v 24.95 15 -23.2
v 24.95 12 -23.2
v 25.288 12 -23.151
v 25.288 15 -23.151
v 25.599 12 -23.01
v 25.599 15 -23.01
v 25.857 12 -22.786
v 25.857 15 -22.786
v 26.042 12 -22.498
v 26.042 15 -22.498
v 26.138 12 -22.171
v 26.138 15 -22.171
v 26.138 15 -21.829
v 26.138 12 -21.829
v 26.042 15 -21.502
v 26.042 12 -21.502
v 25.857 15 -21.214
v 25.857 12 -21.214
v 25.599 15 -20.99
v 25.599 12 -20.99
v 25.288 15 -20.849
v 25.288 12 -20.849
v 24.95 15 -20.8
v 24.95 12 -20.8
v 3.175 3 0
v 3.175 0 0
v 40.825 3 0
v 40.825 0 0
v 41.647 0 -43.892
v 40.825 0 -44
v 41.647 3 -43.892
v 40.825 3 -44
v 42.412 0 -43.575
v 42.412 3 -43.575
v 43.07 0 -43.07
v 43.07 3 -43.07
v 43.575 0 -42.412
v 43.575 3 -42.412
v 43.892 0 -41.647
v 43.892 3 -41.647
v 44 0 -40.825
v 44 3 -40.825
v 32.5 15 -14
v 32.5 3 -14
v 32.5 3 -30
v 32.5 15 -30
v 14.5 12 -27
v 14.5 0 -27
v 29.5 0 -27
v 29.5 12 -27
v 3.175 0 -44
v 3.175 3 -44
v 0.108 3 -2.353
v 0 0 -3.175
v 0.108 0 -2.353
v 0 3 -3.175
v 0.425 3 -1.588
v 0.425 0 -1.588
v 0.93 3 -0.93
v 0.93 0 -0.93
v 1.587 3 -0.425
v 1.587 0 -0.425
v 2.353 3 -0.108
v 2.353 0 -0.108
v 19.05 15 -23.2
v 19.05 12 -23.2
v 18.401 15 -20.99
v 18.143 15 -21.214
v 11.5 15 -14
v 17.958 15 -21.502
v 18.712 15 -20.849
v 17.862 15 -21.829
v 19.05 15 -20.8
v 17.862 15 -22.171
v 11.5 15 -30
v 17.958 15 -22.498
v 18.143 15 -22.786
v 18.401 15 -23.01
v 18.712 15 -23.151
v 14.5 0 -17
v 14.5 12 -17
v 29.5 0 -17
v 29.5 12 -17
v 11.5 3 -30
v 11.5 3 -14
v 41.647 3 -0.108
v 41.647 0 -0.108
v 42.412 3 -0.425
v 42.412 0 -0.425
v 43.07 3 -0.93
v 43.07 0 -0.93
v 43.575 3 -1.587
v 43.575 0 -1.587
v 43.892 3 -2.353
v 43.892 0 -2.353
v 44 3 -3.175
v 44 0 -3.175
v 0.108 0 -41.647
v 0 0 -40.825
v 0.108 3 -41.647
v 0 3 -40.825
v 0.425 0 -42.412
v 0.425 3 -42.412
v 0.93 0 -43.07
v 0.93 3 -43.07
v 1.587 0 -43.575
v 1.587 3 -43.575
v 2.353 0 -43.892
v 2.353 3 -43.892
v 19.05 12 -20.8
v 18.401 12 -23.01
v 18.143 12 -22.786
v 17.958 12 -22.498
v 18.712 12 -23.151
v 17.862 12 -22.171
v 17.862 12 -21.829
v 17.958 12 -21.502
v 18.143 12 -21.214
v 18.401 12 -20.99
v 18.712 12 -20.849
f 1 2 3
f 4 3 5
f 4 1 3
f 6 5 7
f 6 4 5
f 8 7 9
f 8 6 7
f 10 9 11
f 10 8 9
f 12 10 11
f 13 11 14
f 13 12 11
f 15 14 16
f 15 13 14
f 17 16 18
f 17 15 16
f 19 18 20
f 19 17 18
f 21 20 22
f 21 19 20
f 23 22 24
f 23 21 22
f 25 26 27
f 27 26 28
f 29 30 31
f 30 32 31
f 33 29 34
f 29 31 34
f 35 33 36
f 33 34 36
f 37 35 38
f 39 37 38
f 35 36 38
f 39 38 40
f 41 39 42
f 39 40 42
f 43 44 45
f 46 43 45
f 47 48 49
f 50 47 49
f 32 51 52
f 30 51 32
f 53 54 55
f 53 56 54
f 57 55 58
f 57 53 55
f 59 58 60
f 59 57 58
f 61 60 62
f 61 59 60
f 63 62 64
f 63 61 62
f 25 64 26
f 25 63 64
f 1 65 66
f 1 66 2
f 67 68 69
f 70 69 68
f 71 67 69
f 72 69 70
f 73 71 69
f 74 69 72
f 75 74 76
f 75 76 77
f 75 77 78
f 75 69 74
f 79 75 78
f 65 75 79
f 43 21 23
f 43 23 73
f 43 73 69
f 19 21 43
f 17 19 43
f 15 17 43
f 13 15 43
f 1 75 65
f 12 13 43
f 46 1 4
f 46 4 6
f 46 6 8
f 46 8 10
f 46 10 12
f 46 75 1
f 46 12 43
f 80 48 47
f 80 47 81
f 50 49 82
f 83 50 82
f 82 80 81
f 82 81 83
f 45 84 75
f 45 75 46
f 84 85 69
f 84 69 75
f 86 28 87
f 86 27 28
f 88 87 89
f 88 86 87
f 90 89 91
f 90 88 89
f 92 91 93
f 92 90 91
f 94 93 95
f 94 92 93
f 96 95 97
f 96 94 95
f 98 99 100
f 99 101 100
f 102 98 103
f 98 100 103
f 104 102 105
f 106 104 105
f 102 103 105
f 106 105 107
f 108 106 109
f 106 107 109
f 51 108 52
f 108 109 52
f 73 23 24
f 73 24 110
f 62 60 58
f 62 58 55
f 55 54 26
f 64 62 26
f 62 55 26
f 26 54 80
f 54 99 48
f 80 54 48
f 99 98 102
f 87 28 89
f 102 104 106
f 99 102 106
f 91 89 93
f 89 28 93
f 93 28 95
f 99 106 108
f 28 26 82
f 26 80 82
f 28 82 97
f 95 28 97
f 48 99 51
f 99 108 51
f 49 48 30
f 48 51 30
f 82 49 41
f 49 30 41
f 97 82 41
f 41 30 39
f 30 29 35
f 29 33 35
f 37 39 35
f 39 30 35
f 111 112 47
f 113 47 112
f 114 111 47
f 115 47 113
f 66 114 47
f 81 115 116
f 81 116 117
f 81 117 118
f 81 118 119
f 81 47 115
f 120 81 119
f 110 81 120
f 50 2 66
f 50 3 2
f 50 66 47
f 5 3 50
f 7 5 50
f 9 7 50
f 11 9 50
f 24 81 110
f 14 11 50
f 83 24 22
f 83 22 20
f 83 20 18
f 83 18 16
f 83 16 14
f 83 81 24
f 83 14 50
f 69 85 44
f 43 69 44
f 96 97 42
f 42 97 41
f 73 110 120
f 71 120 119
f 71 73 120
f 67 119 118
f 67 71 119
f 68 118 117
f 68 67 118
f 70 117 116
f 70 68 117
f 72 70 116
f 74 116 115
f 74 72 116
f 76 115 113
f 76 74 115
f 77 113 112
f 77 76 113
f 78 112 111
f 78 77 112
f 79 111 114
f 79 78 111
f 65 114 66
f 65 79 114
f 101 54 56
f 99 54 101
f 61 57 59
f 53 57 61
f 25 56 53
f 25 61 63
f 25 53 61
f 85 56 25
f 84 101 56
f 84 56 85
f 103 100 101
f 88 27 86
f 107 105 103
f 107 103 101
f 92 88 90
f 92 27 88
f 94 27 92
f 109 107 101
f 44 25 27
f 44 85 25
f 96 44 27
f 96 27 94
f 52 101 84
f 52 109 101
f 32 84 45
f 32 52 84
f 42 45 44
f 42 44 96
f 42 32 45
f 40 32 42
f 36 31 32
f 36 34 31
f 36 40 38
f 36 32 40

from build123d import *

# Parameters (mm, degrees)
SKETCH1_W           = 44
SKETCH1_H           = 44
BOSS_EXTRUDE1_DEPTH = 3
SKETCH2_W           = 21
SKETCH2_H           = 16
BOSS_EXTRUDE2_DEPTH = 12
SKETCH3_W           = 15
SKETCH3_H           = 10
CUT_EXTRUDE1_DEPTH  = 12
CUT_EXTRUDE2_REACH  = 66.008
FILLET1_R           = 3.175


with BuildPart() as part:
    # Sketch1 → Boss-Extrude1 (new body)
    with BuildSketch(Plane(origin=(0, 0, 0), x_dir=(1, 0, 0), z_dir=(0, 1, 0))):
        with Locations((22, 22)):
            Rectangle(SKETCH1_W, SKETCH1_H)
    extrude(amount=BOSS_EXTRUDE1_DEPTH)

    # Sketch2 → Boss-Extrude2 (add)
    with BuildSketch(Plane(origin=(0, 3, 0), x_dir=(1, 0, 0), z_dir=(0, 1, 0))):
        with Locations((22, 22)):
            Rectangle(SKETCH2_W, SKETCH2_H)
    extrude(amount=BOSS_EXTRUDE2_DEPTH)

    # Sketch3 → Cut-Extrude1 (cut)
    with BuildSketch(Plane.XZ):
        with Locations((22, -22)):
            Rectangle(SKETCH3_W, SKETCH3_H)
    extrude(amount=-CUT_EXTRUDE1_DEPTH, mode=Mode.SUBTRACT)

    # Sketch4 → Cut-Extrude2 (cut, up to next)
    with BuildSketch(Plane(origin=(0, 15, 0), x_dir=(1, 0, 0), z_dir=(0, 1, 0)), mode=Mode.PRIVATE) as cut_extrude2_sk1:
        with BuildLine():
            Line((19.05, 23.2), (24.95, 23.2))
            ThreePointArc((24.95, 23.2), (26.15, 22), (24.95, 20.8))
            Line((24.95, 20.8), (19.05, 20.8))
            ThreePointArc((19.05, 20.8), (17.85, 22), (19.05, 23.2))
        make_face()
    cut_extrude2_tool1 = extrude(cut_extrude2_sk1.sketch, amount=-CUT_EXTRUDE2_REACH, mode=Mode.PRIVATE) & part.part
    add(cut_extrude2_tool1.solids().sort_by_distance((22, 15, -22))[0], mode=Mode.SUBTRACT)

    # Fillet1
    fillet1_edges = [part.edges().sort_by_distance(p)[0] for p in [
        (0, 1.5, -44),
        (44, 1.5, -44),
        (44, 1.5, 0),
        (0, 1.5, 0),
    ]]
    fillet(fillet1_edges, radius=FILLET1_R)


solid = part.part
